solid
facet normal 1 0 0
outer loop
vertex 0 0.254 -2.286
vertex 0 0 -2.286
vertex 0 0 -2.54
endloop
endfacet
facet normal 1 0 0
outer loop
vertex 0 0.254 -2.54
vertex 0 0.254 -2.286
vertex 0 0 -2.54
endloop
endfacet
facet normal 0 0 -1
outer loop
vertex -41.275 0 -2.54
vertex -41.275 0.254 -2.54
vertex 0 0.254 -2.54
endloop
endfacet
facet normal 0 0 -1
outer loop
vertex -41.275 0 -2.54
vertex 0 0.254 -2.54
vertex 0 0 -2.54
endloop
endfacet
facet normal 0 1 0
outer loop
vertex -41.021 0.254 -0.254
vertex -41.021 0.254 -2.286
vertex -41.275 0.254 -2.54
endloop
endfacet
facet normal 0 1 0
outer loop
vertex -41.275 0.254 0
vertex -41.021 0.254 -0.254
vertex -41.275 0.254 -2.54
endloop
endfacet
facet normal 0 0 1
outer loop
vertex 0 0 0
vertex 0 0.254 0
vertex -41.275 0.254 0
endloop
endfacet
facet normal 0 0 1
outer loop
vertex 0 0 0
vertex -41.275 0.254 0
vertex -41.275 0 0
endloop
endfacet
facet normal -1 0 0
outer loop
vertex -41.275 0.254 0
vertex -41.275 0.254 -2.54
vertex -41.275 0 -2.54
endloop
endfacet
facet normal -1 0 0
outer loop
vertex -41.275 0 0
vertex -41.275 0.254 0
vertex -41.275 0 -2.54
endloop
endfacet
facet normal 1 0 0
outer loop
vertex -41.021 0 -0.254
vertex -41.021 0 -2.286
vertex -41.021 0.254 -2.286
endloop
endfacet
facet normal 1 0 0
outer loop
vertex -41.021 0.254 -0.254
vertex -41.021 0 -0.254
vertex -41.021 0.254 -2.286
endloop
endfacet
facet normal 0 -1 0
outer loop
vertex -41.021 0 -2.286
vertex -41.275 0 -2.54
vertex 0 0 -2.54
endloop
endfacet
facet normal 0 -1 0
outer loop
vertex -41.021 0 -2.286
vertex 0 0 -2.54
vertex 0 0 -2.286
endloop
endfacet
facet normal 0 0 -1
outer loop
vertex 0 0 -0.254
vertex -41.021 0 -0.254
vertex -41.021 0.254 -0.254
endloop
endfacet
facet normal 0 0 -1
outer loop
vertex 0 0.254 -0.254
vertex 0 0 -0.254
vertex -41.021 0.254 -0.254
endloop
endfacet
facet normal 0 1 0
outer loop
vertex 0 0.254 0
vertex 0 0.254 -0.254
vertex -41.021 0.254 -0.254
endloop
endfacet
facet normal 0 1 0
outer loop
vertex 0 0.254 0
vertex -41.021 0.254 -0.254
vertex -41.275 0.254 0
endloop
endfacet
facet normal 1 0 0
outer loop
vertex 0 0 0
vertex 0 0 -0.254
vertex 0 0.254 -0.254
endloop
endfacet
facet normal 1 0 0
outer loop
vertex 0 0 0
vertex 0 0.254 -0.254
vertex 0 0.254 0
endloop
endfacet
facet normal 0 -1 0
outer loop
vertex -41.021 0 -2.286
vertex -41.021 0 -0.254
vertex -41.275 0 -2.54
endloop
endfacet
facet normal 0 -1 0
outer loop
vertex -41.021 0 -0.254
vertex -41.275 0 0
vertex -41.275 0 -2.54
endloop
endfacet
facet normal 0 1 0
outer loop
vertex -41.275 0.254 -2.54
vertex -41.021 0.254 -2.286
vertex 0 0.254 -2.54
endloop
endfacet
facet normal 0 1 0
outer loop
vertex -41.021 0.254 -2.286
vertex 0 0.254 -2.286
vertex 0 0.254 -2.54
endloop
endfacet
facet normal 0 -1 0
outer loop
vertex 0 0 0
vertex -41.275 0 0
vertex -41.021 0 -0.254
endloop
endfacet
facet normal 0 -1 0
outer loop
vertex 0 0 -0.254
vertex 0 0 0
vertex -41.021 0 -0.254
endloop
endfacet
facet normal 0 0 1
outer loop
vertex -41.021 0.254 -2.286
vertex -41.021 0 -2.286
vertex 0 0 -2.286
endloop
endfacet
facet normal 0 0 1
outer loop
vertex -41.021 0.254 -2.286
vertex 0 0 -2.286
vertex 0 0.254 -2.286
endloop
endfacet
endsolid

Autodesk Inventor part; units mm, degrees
ref_plane "XZ Plane" through (0, 0, 0) normal (0, 1, 0) x (-1, 0, 0)
sketch "Sketch1" plane through (0, 0, 0) normal (0, 1, 0) x (-1, 0, 0)
  line L0 (0, 0) -> (41.275, 0)
  line L1 (41.275, -2.54) -> (0, -2.54)
  line L2 (41.275, -2.54) -> (41.275, 0)
  dimension "d69" = 41.275
  dimension "d70" = 41.275
  dimension "d89" = 2.54
  dimension "d90" = 0
  dimension "d91" = 0
  dimension "d92" = 0
sketch "Sketch2" plane through (0, 0, 0) normal (1, 0, 0) x (0, 1, 0)
  line L0 (0, 0) -> (0.254, 0)
  line L1 (0.254, 0) -> (0.254, -0.254)
  line L2 (0.254, -0.254) -> (0, -0.254)
  line L3 (0, -0.254) -> (0, 0)
  dimension "d98" = 0.254
  dimension "d99" = 0.254
sweep "Sweep1" add profiles "Sketch2" path "Sketch1"
ref_plane "Work Plane1" through (6.35, 0, 0) normal (1, 0, 0) x (0, 1, 0)
ref_plane "Work Plane2" through (0, 0, -6.35) normal (0, 0, 1) x (1, 0, 0)
ref_plane "Work Plane4" through (0, 0, -2.9845) normal (0, 0, 1) x (1, 0, 0)
properties part number "abs_1_loop" material "Silver"
